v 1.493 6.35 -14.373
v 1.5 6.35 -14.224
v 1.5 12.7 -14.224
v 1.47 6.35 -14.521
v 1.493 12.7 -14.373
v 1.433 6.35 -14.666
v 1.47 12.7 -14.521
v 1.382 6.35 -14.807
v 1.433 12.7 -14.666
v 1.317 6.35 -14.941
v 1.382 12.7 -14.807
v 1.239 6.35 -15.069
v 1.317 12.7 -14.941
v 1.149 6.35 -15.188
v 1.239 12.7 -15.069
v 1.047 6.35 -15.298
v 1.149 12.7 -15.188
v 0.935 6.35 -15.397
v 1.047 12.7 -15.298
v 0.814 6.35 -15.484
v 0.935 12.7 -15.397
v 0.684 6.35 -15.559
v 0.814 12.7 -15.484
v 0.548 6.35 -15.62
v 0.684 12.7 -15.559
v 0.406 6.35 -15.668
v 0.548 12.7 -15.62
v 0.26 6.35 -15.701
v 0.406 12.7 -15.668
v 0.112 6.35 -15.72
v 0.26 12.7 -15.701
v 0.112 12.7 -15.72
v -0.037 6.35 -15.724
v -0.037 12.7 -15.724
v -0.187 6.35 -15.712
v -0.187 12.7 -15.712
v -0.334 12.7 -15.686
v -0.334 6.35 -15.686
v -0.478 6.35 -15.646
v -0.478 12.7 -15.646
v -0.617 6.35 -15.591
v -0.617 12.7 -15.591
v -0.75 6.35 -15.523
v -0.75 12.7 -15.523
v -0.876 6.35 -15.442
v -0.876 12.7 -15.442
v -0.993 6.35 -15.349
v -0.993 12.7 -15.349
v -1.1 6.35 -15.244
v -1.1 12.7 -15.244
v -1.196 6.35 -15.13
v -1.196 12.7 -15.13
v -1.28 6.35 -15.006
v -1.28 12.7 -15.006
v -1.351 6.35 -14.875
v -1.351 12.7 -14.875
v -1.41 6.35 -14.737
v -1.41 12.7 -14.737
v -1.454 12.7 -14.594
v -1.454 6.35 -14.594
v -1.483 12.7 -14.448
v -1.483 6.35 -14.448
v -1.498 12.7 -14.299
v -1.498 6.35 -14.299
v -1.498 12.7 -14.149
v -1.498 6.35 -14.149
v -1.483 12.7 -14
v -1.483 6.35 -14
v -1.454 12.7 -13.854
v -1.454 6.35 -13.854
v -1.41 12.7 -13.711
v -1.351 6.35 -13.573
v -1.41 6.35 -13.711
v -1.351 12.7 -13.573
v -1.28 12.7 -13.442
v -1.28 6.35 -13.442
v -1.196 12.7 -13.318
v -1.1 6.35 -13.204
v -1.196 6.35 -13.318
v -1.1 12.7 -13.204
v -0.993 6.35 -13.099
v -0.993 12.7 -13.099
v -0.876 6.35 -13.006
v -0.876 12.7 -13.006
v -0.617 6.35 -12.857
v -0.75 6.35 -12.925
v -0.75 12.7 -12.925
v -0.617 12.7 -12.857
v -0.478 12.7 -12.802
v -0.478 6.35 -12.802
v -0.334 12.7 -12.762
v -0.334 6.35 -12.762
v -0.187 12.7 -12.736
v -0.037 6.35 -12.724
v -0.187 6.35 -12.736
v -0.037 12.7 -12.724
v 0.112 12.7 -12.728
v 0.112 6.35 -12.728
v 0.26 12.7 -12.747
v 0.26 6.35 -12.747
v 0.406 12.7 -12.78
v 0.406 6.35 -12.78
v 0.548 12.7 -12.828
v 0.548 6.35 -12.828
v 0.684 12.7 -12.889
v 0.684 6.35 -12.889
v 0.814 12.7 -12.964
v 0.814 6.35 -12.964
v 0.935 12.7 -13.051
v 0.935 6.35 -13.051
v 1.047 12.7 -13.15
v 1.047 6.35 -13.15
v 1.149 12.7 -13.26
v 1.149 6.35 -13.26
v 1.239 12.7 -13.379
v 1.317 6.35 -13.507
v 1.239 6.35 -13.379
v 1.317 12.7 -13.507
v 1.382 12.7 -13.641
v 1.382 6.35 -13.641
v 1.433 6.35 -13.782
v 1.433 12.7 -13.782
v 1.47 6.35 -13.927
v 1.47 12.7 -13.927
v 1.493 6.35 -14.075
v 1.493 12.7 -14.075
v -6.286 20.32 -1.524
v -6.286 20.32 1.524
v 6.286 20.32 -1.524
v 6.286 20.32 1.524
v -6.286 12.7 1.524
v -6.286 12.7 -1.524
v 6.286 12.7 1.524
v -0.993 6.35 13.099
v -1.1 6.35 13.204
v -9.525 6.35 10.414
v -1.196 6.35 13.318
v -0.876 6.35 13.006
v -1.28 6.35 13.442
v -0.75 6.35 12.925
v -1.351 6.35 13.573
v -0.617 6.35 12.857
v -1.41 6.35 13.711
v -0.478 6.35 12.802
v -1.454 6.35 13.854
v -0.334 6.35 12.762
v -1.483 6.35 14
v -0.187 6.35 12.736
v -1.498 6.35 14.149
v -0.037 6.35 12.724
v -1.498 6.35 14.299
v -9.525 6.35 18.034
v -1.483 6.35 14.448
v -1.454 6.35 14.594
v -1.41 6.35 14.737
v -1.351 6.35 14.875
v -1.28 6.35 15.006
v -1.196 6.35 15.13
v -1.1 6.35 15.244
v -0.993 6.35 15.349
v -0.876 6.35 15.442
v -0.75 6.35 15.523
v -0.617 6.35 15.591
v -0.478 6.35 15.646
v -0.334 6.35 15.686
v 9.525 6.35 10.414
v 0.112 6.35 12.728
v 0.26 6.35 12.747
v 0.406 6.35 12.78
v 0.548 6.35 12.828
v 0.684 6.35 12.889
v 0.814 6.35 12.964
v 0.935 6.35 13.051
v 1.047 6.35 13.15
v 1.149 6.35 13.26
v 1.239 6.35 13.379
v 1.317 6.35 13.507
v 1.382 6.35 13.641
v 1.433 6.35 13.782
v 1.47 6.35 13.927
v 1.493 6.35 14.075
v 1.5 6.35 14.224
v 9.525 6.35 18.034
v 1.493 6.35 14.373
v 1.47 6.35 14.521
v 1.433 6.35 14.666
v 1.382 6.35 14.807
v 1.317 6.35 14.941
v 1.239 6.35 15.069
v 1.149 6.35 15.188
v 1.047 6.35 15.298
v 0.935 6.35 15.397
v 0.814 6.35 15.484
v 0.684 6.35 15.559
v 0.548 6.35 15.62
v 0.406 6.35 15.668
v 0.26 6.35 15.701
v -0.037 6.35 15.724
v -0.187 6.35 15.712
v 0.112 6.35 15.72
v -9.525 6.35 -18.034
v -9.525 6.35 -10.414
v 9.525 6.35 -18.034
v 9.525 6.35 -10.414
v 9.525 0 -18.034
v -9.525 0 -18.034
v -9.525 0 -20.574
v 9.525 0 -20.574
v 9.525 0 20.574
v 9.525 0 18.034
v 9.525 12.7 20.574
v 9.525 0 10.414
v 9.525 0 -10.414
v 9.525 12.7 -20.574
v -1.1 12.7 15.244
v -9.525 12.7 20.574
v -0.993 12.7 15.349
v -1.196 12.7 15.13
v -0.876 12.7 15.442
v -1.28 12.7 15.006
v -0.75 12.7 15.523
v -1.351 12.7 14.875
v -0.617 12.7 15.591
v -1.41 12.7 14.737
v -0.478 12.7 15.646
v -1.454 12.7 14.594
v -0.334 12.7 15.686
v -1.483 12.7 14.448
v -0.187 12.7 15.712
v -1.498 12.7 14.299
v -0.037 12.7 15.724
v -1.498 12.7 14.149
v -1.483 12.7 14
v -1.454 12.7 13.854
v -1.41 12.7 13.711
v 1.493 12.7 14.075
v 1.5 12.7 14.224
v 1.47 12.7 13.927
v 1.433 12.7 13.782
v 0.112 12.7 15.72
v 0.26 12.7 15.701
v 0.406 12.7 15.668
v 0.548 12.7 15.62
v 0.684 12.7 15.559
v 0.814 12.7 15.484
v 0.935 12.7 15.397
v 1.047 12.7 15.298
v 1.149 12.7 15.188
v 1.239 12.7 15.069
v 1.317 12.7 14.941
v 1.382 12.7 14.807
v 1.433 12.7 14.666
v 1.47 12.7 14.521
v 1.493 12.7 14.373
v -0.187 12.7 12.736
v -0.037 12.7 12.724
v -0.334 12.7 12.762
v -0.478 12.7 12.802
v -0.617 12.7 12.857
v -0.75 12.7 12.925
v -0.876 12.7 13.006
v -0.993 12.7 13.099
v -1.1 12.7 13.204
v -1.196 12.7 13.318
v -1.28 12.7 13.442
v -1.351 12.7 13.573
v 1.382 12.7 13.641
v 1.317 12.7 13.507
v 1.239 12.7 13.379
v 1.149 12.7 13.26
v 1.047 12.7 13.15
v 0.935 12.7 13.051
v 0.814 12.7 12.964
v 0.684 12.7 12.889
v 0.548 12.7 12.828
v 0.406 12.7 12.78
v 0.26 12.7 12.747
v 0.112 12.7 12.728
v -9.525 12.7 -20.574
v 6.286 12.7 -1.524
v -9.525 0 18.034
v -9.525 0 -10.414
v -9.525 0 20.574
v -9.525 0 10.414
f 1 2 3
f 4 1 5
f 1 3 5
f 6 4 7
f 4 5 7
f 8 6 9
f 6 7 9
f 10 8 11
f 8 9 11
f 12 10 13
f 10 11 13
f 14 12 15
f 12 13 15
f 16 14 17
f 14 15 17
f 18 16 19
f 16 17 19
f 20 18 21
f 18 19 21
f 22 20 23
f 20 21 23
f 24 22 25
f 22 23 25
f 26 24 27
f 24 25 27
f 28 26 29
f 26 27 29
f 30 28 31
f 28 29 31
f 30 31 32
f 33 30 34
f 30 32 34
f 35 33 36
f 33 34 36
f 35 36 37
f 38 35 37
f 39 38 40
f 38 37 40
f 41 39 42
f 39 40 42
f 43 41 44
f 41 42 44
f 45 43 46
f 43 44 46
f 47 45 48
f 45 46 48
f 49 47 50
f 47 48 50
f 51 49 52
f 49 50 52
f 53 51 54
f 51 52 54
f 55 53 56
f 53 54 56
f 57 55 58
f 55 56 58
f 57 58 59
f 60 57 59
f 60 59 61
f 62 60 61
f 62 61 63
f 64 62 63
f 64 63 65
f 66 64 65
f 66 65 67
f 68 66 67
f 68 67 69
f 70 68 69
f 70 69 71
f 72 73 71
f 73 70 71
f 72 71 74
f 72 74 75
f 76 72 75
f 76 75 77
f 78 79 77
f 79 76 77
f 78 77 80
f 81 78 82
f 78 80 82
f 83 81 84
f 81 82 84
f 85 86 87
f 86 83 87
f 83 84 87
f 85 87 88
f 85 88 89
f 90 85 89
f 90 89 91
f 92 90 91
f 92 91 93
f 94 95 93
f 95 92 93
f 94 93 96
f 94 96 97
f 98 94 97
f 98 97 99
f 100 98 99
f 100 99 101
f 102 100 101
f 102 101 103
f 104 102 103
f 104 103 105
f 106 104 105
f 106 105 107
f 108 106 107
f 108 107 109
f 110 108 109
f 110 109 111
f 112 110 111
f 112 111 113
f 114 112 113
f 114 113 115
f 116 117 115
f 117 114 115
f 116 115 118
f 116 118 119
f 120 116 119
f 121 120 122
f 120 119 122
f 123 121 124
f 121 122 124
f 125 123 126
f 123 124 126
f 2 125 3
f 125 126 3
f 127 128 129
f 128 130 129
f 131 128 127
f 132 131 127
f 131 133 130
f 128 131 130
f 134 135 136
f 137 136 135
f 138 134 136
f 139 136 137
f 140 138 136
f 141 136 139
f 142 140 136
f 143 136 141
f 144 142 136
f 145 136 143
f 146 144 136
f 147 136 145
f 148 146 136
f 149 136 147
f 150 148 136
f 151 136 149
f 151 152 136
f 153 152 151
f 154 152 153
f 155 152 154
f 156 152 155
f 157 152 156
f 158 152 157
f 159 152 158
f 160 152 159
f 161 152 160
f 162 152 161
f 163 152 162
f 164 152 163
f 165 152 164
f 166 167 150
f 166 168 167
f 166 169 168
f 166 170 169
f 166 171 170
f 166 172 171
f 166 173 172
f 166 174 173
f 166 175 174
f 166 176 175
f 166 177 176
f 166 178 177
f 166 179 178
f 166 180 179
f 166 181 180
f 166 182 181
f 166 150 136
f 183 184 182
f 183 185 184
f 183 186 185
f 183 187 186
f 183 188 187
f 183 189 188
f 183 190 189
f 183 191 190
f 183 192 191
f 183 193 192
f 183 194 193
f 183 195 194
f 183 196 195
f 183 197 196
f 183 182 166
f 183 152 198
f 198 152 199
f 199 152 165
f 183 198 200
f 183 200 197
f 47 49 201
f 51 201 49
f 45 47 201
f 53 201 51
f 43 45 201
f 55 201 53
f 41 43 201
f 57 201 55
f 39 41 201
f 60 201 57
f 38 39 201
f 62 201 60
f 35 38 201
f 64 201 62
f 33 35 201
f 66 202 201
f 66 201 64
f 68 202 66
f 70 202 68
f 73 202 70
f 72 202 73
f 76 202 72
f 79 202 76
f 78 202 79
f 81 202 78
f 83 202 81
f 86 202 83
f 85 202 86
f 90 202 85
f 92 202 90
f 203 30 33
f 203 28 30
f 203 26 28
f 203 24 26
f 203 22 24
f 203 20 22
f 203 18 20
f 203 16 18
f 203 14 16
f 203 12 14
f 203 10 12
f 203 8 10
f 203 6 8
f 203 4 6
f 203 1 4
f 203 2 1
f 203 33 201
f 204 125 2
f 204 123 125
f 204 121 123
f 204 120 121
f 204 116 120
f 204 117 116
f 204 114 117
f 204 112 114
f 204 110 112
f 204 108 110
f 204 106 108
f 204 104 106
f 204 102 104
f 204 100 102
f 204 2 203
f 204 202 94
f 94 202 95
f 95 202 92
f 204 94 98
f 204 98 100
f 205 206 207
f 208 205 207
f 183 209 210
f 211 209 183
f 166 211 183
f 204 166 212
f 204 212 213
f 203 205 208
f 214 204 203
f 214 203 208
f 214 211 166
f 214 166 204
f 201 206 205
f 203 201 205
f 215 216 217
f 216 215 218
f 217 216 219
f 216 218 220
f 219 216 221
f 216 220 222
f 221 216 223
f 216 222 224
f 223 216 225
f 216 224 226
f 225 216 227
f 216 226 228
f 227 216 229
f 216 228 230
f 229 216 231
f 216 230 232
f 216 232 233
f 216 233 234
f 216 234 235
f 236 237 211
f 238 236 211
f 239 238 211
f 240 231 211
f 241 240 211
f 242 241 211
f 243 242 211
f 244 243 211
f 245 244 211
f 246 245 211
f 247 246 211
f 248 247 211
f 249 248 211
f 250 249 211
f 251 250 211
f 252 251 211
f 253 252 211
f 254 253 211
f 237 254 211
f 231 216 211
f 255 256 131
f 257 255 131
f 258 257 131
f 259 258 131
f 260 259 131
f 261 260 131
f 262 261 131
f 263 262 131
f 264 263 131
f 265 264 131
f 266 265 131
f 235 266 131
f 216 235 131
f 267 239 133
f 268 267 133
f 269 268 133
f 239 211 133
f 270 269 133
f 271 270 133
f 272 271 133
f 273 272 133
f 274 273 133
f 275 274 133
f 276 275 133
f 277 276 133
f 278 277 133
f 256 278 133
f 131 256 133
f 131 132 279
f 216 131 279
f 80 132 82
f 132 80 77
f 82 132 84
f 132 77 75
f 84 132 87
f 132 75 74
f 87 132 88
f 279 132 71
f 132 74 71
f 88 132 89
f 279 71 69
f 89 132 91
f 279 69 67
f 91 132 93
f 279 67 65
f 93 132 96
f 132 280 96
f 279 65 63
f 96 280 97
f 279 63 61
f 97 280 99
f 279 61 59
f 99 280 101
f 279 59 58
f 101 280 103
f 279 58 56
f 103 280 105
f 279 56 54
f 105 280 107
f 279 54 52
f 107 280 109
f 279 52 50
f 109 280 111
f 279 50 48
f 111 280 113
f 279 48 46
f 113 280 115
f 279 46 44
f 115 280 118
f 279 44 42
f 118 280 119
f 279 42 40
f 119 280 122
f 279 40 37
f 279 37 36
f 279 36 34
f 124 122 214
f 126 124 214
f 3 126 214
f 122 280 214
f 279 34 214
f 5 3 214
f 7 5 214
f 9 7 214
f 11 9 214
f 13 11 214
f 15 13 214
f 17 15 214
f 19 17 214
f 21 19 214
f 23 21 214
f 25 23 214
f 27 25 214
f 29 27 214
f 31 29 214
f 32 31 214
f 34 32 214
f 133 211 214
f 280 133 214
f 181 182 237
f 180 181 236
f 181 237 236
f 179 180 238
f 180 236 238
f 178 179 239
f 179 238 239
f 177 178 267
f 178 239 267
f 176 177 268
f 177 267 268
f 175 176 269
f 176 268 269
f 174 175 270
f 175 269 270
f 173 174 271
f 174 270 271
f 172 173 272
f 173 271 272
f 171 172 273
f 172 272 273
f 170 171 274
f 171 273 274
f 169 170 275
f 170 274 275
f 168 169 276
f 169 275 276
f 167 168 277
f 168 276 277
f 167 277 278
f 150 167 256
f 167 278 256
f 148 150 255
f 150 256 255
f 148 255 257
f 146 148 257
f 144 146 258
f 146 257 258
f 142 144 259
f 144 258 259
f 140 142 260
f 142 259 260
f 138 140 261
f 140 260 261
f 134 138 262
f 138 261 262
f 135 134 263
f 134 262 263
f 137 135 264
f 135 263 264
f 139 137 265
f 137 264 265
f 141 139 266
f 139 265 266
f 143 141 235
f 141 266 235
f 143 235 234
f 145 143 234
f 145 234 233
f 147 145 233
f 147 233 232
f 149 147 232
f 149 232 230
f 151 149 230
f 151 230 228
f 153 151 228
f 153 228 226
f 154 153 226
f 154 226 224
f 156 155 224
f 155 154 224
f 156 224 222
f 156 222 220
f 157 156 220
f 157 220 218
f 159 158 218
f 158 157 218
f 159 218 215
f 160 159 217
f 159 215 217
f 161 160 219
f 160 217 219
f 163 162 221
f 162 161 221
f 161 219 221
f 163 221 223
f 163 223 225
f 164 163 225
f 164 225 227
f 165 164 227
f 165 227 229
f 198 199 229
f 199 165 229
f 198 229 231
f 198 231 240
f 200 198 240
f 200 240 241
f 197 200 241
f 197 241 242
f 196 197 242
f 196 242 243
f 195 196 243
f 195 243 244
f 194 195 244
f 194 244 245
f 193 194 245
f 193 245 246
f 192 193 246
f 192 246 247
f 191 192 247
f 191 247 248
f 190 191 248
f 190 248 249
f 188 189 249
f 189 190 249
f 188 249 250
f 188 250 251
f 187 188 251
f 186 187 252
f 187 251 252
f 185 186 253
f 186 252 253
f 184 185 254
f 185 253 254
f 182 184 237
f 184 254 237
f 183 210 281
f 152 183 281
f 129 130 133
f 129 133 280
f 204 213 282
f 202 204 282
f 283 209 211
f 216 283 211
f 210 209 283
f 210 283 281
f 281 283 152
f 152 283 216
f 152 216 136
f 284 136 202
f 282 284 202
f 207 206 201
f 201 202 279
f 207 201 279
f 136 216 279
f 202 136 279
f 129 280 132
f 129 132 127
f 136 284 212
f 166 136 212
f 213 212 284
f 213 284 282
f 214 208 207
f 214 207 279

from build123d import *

# Parameters (mm, degrees)
BOSS_EXTRUDE1_DEPTH = 9.525
SKETCH1_3_W         = 3.048
SKETCH1_3_H         = 7.62
BOSS_EXTRUDE2_DEPTH = 6.2865
SKETCH4_R           = 1.5
CUT_EXTRUDE3_DEPTH  = 26.986633122
CUT_EXTRUDE4_START  = -6.35
SKETCH5_W           = 19.05
SKETCH5_H           = 7.62
SKETCH5_R           = 1.5
CUT_EXTRUDE4_DEPTH  = 6.35


with BuildPart() as part:
    # Sketch1 → Boss-Extrude1 (new, symmetric)
    with BuildSketch(Plane(origin=(0, 0, 0), x_dir=(0, 0, -1), z_dir=(1, 0, 0))):
        Polygon((-1.524, 12.7), (-20.574, 12.7), (-20.574, 0), (20.574, 0), (20.574, 12.7), (1.524, 12.7), align=None)
    extrude(amount=BOSS_EXTRUDE1_DEPTH, both=True)

    # Sketch1<3> → Boss-Extrude2 (add, symmetric)
    with BuildSketch(Plane(origin=(0, 0, 0), x_dir=(0, 0, -1), z_dir=(1, 0, 0))):
        with Locations((0, 16.51)):
            Rectangle(SKETCH1_3_W, SKETCH1_3_H)
    extrude(amount=BOSS_EXTRUDE2_DEPTH, both=True)

    # Sketch4 → Cut-Extrude3 (cut, through all)
    with BuildSketch(Plane(origin=(0, 12.7, 0), x_dir=(1, 0, 0), z_dir=(0, 1, 0))):
        with Locations((0, -14.224)):
            Circle(SKETCH4_R)
        with Locations((0, 14.224)):
            Circle(SKETCH4_R)
    extrude(amount=-CUT_EXTRUDE3_DEPTH, mode=Mode.SUBTRACT)

    # Sketch5 → Cut-Extrude4 (cut)
    # profile 1 of 2: a face of its own
    with BuildSketch(Plane.XZ.offset(CUT_EXTRUDE4_START)):
        with Locations((0, -14.224)):
            Rectangle(SKETCH5_W, SKETCH5_H)
        with Locations((0, -14.224)):
            Circle(SKETCH5_R, mode=Mode.SUBTRACT)
    # profile 2 of 2: a face of its own
    with BuildSketch(Plane.XZ.offset(CUT_EXTRUDE4_START)):
        with Locations((0, 14.224)):
            Rectangle(SKETCH5_W, SKETCH5_H)
        with Locations((0, 14.224)):
            Circle(SKETCH5_R, mode=Mode.SUBTRACT)
    extrude(amount=CUT_EXTRUDE4_DEPTH, mode=Mode.SUBTRACT)


solid = part.part
